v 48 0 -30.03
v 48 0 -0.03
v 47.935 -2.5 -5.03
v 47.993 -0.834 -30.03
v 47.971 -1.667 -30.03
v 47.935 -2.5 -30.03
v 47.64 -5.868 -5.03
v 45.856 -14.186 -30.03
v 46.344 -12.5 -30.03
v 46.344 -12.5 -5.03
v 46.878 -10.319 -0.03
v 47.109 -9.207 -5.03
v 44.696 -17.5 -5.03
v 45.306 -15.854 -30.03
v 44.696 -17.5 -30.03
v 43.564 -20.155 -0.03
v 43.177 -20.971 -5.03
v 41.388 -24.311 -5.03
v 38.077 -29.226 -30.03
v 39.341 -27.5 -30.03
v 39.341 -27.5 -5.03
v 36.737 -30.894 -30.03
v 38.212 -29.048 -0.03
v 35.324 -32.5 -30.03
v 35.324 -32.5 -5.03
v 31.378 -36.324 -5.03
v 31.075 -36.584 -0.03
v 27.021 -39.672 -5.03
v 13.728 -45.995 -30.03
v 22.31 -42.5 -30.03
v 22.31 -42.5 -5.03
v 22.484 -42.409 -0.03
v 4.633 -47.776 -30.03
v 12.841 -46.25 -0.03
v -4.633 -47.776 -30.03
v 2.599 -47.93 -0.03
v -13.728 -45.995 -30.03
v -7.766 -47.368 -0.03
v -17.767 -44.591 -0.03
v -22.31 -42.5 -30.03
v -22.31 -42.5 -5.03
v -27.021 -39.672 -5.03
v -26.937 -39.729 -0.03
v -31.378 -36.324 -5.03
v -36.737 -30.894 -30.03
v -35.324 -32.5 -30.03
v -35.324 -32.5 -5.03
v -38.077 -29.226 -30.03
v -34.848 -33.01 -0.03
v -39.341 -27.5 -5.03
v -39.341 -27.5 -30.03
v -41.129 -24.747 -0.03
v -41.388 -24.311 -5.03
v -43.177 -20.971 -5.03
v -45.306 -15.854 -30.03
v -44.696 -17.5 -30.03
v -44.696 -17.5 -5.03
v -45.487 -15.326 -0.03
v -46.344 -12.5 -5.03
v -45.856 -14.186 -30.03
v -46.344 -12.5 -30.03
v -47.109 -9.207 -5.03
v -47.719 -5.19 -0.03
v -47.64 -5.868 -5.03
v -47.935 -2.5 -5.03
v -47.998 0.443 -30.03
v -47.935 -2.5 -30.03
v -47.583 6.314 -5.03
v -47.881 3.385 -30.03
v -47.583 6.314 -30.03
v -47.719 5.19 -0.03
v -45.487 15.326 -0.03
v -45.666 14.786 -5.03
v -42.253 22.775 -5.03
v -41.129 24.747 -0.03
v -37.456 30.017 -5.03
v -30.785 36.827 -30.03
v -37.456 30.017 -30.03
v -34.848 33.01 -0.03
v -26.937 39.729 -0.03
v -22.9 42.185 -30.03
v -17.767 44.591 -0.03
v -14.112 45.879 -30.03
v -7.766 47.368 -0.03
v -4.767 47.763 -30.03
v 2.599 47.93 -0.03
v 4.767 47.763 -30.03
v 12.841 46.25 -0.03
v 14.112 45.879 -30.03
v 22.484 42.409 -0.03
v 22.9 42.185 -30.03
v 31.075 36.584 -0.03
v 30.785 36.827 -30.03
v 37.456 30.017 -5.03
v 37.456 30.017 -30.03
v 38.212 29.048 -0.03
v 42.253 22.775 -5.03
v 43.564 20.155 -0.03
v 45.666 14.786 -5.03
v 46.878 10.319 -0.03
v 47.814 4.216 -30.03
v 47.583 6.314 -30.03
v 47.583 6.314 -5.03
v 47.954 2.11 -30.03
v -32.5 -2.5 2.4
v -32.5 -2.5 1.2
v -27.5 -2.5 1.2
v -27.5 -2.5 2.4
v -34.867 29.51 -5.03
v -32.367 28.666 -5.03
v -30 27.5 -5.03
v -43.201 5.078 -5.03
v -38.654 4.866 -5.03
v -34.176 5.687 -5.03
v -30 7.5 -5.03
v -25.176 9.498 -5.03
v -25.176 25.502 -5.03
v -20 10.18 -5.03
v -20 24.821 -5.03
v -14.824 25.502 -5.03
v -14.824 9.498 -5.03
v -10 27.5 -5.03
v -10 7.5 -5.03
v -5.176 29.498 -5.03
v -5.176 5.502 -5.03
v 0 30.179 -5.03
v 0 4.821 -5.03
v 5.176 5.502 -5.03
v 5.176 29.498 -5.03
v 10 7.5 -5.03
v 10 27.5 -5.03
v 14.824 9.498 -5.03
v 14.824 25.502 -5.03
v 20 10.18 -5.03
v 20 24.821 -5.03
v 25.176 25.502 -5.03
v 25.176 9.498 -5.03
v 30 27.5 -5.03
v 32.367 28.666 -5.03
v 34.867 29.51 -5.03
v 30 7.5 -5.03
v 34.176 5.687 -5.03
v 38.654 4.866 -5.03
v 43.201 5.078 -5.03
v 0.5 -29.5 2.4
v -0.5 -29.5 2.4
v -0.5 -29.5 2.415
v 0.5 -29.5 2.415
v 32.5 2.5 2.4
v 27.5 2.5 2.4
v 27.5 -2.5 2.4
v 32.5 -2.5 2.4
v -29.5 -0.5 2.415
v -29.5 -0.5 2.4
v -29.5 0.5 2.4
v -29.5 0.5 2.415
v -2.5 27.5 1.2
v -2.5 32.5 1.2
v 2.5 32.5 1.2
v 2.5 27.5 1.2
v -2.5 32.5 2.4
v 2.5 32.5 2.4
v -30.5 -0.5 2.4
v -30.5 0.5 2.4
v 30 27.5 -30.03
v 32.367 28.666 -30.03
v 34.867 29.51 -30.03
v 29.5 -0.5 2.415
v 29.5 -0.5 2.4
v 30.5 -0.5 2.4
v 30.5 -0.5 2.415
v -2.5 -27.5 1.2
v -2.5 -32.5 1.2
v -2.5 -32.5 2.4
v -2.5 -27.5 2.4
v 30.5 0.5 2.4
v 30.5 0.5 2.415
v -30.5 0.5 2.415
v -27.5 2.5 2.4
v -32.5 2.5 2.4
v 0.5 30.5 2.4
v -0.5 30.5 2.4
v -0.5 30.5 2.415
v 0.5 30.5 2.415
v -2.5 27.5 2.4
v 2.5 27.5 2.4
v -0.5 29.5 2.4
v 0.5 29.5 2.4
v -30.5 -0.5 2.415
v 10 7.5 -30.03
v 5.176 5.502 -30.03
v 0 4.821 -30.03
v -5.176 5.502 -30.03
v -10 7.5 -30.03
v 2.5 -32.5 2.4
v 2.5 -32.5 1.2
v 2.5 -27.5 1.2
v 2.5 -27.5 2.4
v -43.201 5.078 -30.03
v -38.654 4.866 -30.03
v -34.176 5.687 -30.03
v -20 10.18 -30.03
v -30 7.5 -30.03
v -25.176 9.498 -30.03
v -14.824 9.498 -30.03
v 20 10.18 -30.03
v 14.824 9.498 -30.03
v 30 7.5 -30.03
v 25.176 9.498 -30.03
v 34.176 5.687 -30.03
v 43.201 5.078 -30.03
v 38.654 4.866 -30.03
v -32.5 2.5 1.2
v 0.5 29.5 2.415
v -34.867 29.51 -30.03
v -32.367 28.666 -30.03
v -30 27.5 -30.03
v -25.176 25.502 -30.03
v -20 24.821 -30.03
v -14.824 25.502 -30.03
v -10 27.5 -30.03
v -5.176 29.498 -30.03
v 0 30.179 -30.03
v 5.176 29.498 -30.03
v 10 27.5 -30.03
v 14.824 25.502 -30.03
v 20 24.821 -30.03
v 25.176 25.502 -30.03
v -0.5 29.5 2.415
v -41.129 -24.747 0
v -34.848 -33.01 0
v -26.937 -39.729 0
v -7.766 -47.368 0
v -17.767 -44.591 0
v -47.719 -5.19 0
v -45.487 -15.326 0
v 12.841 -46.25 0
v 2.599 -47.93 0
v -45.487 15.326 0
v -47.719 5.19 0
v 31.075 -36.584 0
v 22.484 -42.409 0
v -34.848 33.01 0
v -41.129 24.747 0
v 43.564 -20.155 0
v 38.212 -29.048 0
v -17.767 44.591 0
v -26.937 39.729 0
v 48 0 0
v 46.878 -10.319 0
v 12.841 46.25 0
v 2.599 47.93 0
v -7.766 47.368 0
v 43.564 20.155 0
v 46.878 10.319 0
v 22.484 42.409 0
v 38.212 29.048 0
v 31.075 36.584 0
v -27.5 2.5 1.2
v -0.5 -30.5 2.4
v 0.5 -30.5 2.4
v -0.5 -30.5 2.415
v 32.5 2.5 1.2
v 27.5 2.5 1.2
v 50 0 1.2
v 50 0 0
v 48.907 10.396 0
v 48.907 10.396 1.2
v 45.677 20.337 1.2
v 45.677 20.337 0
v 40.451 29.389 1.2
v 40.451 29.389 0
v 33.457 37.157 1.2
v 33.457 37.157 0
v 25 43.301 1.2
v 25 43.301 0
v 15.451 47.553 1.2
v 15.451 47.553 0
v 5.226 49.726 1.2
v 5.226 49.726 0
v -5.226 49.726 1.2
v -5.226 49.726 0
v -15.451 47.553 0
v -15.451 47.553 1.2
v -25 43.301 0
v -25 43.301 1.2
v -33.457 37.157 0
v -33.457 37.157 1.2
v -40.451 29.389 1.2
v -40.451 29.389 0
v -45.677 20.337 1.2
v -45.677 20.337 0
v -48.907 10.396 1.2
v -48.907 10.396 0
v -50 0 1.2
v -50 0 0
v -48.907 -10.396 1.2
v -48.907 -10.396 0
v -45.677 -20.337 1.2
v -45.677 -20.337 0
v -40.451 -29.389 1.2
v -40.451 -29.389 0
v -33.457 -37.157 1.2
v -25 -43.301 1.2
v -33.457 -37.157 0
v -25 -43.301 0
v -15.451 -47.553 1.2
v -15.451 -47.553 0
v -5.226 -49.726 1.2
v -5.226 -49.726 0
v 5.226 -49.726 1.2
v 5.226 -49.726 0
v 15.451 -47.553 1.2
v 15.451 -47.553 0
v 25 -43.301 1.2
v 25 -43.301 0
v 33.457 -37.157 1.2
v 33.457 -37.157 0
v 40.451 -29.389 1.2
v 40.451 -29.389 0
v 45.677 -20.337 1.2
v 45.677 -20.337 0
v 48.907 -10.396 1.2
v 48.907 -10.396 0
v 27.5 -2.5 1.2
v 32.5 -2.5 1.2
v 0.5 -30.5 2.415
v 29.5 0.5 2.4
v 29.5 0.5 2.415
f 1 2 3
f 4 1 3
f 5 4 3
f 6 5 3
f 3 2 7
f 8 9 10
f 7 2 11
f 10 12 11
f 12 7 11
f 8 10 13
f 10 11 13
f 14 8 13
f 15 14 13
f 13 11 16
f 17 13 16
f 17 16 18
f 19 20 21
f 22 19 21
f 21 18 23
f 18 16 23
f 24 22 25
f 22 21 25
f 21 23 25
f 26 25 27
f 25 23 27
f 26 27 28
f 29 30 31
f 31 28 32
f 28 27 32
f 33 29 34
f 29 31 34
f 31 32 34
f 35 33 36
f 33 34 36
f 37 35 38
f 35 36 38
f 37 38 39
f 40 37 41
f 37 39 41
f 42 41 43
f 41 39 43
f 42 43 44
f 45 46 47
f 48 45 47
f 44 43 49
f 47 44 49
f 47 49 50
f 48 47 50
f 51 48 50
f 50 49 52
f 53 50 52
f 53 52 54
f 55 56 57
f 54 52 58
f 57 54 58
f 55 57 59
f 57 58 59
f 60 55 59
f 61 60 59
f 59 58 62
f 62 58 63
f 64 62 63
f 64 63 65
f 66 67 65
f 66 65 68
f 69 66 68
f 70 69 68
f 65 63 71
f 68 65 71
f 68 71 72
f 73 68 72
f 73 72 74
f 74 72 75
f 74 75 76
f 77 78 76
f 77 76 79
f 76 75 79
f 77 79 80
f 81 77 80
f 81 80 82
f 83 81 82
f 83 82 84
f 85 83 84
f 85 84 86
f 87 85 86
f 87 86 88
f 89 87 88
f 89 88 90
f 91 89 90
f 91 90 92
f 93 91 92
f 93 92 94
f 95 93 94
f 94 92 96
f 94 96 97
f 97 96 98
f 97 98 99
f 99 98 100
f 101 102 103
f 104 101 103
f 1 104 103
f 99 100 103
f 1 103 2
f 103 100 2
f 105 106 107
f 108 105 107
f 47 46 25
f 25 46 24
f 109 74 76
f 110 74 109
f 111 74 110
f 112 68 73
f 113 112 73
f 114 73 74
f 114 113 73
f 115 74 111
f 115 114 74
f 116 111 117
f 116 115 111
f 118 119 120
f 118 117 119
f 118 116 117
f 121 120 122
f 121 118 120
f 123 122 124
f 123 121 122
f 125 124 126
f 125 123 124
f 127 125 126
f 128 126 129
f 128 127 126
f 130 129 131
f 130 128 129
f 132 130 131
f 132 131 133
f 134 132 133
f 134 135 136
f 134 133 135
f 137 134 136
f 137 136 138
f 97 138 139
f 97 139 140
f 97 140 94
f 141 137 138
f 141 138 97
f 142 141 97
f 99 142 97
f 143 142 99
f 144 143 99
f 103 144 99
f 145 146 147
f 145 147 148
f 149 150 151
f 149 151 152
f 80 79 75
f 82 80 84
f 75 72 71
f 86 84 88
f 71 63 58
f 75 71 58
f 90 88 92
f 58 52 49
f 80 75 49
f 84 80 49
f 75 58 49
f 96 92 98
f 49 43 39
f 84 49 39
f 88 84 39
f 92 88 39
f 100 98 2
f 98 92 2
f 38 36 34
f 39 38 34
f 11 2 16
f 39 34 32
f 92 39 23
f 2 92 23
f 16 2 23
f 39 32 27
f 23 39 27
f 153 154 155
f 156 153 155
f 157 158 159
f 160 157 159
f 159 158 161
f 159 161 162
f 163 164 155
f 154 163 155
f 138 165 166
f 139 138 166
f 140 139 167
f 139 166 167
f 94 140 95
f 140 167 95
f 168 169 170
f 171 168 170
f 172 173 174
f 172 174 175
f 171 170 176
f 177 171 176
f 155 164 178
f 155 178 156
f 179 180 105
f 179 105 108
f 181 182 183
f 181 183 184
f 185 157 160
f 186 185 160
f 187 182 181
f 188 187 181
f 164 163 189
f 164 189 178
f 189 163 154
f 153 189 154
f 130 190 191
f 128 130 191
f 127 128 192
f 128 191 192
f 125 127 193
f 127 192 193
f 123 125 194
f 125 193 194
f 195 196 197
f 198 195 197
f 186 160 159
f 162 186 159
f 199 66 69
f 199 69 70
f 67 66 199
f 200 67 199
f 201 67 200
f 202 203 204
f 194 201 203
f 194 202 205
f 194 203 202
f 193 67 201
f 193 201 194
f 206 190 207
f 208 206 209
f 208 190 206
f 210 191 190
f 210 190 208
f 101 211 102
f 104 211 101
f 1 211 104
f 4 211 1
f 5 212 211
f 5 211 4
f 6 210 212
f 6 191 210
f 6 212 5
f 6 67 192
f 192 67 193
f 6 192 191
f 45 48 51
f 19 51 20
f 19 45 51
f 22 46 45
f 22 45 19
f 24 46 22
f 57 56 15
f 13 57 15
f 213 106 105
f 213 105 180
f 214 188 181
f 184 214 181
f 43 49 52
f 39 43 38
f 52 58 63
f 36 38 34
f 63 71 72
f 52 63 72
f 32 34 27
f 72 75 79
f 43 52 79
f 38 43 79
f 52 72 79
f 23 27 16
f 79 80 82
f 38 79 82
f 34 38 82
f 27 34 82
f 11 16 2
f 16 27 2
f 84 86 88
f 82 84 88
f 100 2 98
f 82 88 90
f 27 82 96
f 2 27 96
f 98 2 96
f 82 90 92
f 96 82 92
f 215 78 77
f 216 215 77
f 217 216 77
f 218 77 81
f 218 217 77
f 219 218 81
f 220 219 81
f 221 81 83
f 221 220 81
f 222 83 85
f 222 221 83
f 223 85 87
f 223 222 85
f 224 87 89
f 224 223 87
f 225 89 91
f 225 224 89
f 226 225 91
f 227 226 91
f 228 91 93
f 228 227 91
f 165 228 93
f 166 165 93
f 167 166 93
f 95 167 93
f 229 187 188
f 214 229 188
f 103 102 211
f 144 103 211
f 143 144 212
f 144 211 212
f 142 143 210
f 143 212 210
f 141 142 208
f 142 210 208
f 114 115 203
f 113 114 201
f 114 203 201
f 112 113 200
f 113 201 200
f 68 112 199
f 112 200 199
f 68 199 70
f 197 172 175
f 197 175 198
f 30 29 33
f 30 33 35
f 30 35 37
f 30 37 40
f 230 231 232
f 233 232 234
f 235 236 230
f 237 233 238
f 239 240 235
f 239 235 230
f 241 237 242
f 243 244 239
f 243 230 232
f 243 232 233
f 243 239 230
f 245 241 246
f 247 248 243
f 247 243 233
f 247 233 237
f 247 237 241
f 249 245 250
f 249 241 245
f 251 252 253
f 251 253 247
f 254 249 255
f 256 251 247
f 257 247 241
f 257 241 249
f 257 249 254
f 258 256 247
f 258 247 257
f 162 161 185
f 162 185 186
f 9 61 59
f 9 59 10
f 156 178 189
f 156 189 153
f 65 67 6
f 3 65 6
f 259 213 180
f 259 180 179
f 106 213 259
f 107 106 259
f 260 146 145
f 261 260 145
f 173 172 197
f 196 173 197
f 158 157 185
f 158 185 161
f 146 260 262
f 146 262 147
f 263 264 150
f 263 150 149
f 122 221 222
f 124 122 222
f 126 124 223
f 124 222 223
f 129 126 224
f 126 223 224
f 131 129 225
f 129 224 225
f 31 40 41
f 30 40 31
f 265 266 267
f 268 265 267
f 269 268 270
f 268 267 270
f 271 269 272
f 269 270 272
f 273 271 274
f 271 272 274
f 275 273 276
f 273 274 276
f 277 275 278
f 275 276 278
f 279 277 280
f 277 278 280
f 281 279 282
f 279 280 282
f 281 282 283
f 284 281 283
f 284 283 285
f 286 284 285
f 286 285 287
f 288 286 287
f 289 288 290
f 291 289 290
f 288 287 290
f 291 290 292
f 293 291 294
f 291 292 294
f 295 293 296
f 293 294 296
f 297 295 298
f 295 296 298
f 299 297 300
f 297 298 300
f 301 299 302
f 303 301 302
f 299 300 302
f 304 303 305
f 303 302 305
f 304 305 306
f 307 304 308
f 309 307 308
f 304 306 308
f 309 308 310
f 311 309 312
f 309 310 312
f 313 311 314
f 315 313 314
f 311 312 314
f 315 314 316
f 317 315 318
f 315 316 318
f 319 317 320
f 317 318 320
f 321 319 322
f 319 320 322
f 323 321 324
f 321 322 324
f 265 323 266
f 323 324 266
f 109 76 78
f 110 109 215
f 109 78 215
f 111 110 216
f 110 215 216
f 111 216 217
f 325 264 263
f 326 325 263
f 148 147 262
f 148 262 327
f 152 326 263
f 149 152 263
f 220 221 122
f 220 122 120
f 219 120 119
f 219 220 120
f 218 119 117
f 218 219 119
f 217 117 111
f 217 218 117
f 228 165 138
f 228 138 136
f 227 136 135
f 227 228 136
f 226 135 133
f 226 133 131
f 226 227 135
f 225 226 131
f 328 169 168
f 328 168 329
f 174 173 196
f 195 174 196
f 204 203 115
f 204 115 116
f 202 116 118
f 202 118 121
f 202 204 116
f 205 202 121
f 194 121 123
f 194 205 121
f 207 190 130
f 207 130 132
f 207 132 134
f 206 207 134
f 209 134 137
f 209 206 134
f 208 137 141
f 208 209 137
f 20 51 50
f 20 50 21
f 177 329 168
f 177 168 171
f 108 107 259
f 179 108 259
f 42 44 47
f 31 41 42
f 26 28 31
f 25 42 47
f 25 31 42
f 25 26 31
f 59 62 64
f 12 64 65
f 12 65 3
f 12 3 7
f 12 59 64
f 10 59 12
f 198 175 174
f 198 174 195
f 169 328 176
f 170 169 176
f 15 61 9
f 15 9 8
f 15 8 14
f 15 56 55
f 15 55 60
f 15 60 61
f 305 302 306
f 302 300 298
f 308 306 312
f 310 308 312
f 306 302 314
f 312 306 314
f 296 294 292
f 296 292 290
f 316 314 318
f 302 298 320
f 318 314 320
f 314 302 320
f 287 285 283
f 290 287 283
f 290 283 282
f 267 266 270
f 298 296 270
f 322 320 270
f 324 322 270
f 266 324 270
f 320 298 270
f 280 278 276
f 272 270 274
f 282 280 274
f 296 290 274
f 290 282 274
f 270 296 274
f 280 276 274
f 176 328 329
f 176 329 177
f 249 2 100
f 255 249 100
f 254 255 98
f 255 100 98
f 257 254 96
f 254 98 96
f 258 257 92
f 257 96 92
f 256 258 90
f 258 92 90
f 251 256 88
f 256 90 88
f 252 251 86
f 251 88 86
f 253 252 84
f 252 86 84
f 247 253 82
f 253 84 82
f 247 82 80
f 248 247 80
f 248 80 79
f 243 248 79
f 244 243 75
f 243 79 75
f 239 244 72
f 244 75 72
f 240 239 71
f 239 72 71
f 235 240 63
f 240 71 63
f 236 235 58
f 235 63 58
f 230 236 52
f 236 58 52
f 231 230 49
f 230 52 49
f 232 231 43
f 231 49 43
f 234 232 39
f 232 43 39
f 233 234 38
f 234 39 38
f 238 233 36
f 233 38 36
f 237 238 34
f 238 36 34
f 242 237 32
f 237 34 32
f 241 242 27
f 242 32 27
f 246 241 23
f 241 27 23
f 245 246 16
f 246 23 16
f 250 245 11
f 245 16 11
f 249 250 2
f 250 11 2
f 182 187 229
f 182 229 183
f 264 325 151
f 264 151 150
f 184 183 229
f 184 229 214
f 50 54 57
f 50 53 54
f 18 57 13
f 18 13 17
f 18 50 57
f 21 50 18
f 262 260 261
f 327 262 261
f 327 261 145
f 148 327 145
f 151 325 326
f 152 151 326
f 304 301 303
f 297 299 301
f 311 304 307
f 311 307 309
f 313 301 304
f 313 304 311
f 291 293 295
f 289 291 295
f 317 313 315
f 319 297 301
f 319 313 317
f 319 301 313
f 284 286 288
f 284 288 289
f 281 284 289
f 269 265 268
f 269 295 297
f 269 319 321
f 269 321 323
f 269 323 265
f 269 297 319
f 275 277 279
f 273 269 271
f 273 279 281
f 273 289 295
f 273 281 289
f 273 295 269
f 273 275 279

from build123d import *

# Parameters (mm, degrees)
CYLINDER_R        = 50
CYLINDER_DEPTH    = 1.2
CYLINDER001_R     = 48
CYLINDER001_DEPTH = 0.03
BOX_W             = 5
BOX_H             = 5
BOX_DEPTH         = 1.2
BOX001_W          = 5
BOX001_H          = 5
BOX001_DEPTH      = 1.2
BOX002_W          = 5
BOX002_H          = 5
BOX002_DEPTH      = 1.2
BOX003_W          = 5
BOX003_H          = 5
BOX003_DEPTH      = 1.2
BOX004_W          = 1
BOX004_H          = 1
BOX004_DEPTH      = 0.015
BOX005_W          = 1
BOX005_H          = 1
BOX005_DEPTH      = 0.015
BOX006_W          = 1
BOX006_H          = 1
BOX006_DEPTH      = 0.015
BOX007_W          = 1
BOX007_H          = 1
BOX007_DEPTH      = 0.015
SKETCH_R          = 48
EXTRUDE_DEPTH     = 30
SKETCH001_W       = 100
SKETCH001_H       = 10
POCKET_DEPTH      = 25


with BuildPart() as pcb:
    # Cylinder → Cylinder (new body)
    with BuildSketch(Plane.XY):
        Circle(CYLINDER_R)
    extrude(amount=CYLINDER_DEPTH)


with BuildPart() as tim:
    # Cylinder001 → Cylinder001 (new body)
    with BuildSketch(Plane.XY.offset(-0.03)):
        Circle(CYLINDER001_R)
    extrude(amount=CYLINDER001_DEPTH)


with BuildPart() as slug01:
    # Box → Box (new body)
    with BuildSketch(Plane(origin=(-2.5, 27.5, 1.2), x_dir=(1, 0, 0), z_dir=(0, 0, 1))):
        with Locations((2.5, 2.5)):
            Rectangle(BOX_W, BOX_H)
    extrude(amount=BOX_DEPTH)


with BuildPart() as slug02:
    # Box001 → Box001 (new body)
    with BuildSketch(Plane(origin=(27.5, -2.5, 1.2), x_dir=(1, 0, 0), z_dir=(0, 0, 1))):
        with Locations((2.5, 2.5)):
            Rectangle(BOX001_W, BOX001_H)
    extrude(amount=BOX001_DEPTH)


with BuildPart() as slug03:
    # Box002 → Box002 (new body)
    with BuildSketch(Plane(origin=(-2.5, -32.5, 1.2), x_dir=(1, 0, 0), z_dir=(0, 0, 1))):
        with Locations((2.5, 2.5)):
            Rectangle(BOX002_W, BOX002_H)
    extrude(amount=BOX002_DEPTH)


with BuildPart() as slug04:
    # Box003 → Box003 (new body)
    with BuildSketch(Plane(origin=(-32.5, -2.5, 1.2), x_dir=(1, 0, 0), z_dir=(0, 0, 1))):
        with Locations((2.5, 2.5)):
            Rectangle(BOX003_W, BOX003_H)
    extrude(amount=BOX003_DEPTH)


with BuildPart() as led01:
    # Box004 → Box004 (new body)
    with BuildSketch(Plane(origin=(-0.5, 29.5, 2.4), x_dir=(1, 0, 0), z_dir=(0, 0, 1))):
        with Locations((0.5, 0.5)):
            Rectangle(BOX004_W, BOX004_H)
    extrude(amount=BOX004_DEPTH)


with BuildPart() as led02:
    # Box005 → Box005 (new body)
    with BuildSketch(Plane(origin=(29.5, -0.5, 2.4), x_dir=(1, 0, 0), z_dir=(0, 0, 1))):
        with Locations((0.5, 0.5)):
            Rectangle(BOX005_W, BOX005_H)
    extrude(amount=BOX005_DEPTH)


with BuildPart() as led03:
    # Box006 → Box006 (new body)
    with BuildSketch(Plane(origin=(-0.5, -30.5, 2.4), x_dir=(1, 0, 0), z_dir=(0, 0, 1))):
        with Locations((0.5, 0.5)):
            Rectangle(BOX006_W, BOX006_H)
    extrude(amount=BOX006_DEPTH)


with BuildPart() as led04:
    # Box007 → Box007 (new body)
    with BuildSketch(Plane(origin=(-30.5, -0.5, 2.4), x_dir=(1, 0, 0), z_dir=(0, 0, 1))):
        with Locations((0.5, 0.5)):
            Rectangle(BOX007_W, BOX007_H)
    extrude(amount=BOX007_DEPTH)


with BuildPart() as heatsink:
    # Sketch → Extrude (new body)
    with BuildSketch(Plane(origin=(0, 0, -0.03), x_dir=(1, 0, 0), z_dir=(0, 0, -1))):
        Circle(SKETCH_R)
    extrude(amount=EXTRUDE_DEPTH)

    # Sketch001 → Pocket (cut)
    with BuildSketch(Plane(origin=(0, 0, -30.03), x_dir=(1, 0, 0), z_dir=(0, 0, -1))):
        with Locations((0, 37.5)):
            Rectangle(SKETCH001_W, SKETCH001_H)
        with Locations((0, 22.5)):
            Rectangle(SKETCH001_W, SKETCH001_H)
        with Locations((0, 7.5)):
            Rectangle(SKETCH001_W, SKETCH001_H)
        with BuildLine():
            ThreePointArc((-30.000043, -7.5), (-40.000022, -4.820521), (-50, -7.5))
            Line((-50, -7.5), (-50, -27.5))
            ThreePointArc((-50, -27.5), (-40, -30.179492), (-29.999999, -27.5))
            ThreePointArc((-10, -27.5), (-20, -24.820508), (-29.999999, -27.5))
            ThreePointArc((-10, -27.5), (0, -30.179492), (10, -27.5))
            ThreePointArc((29.999997, -27.5), (19.999999, -24.820509), (10, -27.5))
            ThreePointArc((29.999997, -27.5), (39.999999, -30.179493), (50, -27.5))
            Line((50, -7.5), (50, -27.5))
            ThreePointArc((50, -7.5), (40.000022, -4.820521), (30.000044, -7.5))
            ThreePointArc((9.999977, -7.5), (20.00001, -10.179511), (30.000044, -7.5))
            ThreePointArc((9.999977, -7.5), (0, -4.820521), (-9.999977, -7.5))
            ThreePointArc((-30.000043, -7.5), (-20.00001, -10.179511), (-9.999977, -7.5))
        make_face()
    extrude(amount=-POCKET_DEPTH, mode=Mode.SUBTRACT)


solid = Compound([pcb.part, tim.part, slug01.part, slug02.part, slug03.part, slug04.part, led01.part, led02.part, led03.part, led04.part, heatsink.part])
